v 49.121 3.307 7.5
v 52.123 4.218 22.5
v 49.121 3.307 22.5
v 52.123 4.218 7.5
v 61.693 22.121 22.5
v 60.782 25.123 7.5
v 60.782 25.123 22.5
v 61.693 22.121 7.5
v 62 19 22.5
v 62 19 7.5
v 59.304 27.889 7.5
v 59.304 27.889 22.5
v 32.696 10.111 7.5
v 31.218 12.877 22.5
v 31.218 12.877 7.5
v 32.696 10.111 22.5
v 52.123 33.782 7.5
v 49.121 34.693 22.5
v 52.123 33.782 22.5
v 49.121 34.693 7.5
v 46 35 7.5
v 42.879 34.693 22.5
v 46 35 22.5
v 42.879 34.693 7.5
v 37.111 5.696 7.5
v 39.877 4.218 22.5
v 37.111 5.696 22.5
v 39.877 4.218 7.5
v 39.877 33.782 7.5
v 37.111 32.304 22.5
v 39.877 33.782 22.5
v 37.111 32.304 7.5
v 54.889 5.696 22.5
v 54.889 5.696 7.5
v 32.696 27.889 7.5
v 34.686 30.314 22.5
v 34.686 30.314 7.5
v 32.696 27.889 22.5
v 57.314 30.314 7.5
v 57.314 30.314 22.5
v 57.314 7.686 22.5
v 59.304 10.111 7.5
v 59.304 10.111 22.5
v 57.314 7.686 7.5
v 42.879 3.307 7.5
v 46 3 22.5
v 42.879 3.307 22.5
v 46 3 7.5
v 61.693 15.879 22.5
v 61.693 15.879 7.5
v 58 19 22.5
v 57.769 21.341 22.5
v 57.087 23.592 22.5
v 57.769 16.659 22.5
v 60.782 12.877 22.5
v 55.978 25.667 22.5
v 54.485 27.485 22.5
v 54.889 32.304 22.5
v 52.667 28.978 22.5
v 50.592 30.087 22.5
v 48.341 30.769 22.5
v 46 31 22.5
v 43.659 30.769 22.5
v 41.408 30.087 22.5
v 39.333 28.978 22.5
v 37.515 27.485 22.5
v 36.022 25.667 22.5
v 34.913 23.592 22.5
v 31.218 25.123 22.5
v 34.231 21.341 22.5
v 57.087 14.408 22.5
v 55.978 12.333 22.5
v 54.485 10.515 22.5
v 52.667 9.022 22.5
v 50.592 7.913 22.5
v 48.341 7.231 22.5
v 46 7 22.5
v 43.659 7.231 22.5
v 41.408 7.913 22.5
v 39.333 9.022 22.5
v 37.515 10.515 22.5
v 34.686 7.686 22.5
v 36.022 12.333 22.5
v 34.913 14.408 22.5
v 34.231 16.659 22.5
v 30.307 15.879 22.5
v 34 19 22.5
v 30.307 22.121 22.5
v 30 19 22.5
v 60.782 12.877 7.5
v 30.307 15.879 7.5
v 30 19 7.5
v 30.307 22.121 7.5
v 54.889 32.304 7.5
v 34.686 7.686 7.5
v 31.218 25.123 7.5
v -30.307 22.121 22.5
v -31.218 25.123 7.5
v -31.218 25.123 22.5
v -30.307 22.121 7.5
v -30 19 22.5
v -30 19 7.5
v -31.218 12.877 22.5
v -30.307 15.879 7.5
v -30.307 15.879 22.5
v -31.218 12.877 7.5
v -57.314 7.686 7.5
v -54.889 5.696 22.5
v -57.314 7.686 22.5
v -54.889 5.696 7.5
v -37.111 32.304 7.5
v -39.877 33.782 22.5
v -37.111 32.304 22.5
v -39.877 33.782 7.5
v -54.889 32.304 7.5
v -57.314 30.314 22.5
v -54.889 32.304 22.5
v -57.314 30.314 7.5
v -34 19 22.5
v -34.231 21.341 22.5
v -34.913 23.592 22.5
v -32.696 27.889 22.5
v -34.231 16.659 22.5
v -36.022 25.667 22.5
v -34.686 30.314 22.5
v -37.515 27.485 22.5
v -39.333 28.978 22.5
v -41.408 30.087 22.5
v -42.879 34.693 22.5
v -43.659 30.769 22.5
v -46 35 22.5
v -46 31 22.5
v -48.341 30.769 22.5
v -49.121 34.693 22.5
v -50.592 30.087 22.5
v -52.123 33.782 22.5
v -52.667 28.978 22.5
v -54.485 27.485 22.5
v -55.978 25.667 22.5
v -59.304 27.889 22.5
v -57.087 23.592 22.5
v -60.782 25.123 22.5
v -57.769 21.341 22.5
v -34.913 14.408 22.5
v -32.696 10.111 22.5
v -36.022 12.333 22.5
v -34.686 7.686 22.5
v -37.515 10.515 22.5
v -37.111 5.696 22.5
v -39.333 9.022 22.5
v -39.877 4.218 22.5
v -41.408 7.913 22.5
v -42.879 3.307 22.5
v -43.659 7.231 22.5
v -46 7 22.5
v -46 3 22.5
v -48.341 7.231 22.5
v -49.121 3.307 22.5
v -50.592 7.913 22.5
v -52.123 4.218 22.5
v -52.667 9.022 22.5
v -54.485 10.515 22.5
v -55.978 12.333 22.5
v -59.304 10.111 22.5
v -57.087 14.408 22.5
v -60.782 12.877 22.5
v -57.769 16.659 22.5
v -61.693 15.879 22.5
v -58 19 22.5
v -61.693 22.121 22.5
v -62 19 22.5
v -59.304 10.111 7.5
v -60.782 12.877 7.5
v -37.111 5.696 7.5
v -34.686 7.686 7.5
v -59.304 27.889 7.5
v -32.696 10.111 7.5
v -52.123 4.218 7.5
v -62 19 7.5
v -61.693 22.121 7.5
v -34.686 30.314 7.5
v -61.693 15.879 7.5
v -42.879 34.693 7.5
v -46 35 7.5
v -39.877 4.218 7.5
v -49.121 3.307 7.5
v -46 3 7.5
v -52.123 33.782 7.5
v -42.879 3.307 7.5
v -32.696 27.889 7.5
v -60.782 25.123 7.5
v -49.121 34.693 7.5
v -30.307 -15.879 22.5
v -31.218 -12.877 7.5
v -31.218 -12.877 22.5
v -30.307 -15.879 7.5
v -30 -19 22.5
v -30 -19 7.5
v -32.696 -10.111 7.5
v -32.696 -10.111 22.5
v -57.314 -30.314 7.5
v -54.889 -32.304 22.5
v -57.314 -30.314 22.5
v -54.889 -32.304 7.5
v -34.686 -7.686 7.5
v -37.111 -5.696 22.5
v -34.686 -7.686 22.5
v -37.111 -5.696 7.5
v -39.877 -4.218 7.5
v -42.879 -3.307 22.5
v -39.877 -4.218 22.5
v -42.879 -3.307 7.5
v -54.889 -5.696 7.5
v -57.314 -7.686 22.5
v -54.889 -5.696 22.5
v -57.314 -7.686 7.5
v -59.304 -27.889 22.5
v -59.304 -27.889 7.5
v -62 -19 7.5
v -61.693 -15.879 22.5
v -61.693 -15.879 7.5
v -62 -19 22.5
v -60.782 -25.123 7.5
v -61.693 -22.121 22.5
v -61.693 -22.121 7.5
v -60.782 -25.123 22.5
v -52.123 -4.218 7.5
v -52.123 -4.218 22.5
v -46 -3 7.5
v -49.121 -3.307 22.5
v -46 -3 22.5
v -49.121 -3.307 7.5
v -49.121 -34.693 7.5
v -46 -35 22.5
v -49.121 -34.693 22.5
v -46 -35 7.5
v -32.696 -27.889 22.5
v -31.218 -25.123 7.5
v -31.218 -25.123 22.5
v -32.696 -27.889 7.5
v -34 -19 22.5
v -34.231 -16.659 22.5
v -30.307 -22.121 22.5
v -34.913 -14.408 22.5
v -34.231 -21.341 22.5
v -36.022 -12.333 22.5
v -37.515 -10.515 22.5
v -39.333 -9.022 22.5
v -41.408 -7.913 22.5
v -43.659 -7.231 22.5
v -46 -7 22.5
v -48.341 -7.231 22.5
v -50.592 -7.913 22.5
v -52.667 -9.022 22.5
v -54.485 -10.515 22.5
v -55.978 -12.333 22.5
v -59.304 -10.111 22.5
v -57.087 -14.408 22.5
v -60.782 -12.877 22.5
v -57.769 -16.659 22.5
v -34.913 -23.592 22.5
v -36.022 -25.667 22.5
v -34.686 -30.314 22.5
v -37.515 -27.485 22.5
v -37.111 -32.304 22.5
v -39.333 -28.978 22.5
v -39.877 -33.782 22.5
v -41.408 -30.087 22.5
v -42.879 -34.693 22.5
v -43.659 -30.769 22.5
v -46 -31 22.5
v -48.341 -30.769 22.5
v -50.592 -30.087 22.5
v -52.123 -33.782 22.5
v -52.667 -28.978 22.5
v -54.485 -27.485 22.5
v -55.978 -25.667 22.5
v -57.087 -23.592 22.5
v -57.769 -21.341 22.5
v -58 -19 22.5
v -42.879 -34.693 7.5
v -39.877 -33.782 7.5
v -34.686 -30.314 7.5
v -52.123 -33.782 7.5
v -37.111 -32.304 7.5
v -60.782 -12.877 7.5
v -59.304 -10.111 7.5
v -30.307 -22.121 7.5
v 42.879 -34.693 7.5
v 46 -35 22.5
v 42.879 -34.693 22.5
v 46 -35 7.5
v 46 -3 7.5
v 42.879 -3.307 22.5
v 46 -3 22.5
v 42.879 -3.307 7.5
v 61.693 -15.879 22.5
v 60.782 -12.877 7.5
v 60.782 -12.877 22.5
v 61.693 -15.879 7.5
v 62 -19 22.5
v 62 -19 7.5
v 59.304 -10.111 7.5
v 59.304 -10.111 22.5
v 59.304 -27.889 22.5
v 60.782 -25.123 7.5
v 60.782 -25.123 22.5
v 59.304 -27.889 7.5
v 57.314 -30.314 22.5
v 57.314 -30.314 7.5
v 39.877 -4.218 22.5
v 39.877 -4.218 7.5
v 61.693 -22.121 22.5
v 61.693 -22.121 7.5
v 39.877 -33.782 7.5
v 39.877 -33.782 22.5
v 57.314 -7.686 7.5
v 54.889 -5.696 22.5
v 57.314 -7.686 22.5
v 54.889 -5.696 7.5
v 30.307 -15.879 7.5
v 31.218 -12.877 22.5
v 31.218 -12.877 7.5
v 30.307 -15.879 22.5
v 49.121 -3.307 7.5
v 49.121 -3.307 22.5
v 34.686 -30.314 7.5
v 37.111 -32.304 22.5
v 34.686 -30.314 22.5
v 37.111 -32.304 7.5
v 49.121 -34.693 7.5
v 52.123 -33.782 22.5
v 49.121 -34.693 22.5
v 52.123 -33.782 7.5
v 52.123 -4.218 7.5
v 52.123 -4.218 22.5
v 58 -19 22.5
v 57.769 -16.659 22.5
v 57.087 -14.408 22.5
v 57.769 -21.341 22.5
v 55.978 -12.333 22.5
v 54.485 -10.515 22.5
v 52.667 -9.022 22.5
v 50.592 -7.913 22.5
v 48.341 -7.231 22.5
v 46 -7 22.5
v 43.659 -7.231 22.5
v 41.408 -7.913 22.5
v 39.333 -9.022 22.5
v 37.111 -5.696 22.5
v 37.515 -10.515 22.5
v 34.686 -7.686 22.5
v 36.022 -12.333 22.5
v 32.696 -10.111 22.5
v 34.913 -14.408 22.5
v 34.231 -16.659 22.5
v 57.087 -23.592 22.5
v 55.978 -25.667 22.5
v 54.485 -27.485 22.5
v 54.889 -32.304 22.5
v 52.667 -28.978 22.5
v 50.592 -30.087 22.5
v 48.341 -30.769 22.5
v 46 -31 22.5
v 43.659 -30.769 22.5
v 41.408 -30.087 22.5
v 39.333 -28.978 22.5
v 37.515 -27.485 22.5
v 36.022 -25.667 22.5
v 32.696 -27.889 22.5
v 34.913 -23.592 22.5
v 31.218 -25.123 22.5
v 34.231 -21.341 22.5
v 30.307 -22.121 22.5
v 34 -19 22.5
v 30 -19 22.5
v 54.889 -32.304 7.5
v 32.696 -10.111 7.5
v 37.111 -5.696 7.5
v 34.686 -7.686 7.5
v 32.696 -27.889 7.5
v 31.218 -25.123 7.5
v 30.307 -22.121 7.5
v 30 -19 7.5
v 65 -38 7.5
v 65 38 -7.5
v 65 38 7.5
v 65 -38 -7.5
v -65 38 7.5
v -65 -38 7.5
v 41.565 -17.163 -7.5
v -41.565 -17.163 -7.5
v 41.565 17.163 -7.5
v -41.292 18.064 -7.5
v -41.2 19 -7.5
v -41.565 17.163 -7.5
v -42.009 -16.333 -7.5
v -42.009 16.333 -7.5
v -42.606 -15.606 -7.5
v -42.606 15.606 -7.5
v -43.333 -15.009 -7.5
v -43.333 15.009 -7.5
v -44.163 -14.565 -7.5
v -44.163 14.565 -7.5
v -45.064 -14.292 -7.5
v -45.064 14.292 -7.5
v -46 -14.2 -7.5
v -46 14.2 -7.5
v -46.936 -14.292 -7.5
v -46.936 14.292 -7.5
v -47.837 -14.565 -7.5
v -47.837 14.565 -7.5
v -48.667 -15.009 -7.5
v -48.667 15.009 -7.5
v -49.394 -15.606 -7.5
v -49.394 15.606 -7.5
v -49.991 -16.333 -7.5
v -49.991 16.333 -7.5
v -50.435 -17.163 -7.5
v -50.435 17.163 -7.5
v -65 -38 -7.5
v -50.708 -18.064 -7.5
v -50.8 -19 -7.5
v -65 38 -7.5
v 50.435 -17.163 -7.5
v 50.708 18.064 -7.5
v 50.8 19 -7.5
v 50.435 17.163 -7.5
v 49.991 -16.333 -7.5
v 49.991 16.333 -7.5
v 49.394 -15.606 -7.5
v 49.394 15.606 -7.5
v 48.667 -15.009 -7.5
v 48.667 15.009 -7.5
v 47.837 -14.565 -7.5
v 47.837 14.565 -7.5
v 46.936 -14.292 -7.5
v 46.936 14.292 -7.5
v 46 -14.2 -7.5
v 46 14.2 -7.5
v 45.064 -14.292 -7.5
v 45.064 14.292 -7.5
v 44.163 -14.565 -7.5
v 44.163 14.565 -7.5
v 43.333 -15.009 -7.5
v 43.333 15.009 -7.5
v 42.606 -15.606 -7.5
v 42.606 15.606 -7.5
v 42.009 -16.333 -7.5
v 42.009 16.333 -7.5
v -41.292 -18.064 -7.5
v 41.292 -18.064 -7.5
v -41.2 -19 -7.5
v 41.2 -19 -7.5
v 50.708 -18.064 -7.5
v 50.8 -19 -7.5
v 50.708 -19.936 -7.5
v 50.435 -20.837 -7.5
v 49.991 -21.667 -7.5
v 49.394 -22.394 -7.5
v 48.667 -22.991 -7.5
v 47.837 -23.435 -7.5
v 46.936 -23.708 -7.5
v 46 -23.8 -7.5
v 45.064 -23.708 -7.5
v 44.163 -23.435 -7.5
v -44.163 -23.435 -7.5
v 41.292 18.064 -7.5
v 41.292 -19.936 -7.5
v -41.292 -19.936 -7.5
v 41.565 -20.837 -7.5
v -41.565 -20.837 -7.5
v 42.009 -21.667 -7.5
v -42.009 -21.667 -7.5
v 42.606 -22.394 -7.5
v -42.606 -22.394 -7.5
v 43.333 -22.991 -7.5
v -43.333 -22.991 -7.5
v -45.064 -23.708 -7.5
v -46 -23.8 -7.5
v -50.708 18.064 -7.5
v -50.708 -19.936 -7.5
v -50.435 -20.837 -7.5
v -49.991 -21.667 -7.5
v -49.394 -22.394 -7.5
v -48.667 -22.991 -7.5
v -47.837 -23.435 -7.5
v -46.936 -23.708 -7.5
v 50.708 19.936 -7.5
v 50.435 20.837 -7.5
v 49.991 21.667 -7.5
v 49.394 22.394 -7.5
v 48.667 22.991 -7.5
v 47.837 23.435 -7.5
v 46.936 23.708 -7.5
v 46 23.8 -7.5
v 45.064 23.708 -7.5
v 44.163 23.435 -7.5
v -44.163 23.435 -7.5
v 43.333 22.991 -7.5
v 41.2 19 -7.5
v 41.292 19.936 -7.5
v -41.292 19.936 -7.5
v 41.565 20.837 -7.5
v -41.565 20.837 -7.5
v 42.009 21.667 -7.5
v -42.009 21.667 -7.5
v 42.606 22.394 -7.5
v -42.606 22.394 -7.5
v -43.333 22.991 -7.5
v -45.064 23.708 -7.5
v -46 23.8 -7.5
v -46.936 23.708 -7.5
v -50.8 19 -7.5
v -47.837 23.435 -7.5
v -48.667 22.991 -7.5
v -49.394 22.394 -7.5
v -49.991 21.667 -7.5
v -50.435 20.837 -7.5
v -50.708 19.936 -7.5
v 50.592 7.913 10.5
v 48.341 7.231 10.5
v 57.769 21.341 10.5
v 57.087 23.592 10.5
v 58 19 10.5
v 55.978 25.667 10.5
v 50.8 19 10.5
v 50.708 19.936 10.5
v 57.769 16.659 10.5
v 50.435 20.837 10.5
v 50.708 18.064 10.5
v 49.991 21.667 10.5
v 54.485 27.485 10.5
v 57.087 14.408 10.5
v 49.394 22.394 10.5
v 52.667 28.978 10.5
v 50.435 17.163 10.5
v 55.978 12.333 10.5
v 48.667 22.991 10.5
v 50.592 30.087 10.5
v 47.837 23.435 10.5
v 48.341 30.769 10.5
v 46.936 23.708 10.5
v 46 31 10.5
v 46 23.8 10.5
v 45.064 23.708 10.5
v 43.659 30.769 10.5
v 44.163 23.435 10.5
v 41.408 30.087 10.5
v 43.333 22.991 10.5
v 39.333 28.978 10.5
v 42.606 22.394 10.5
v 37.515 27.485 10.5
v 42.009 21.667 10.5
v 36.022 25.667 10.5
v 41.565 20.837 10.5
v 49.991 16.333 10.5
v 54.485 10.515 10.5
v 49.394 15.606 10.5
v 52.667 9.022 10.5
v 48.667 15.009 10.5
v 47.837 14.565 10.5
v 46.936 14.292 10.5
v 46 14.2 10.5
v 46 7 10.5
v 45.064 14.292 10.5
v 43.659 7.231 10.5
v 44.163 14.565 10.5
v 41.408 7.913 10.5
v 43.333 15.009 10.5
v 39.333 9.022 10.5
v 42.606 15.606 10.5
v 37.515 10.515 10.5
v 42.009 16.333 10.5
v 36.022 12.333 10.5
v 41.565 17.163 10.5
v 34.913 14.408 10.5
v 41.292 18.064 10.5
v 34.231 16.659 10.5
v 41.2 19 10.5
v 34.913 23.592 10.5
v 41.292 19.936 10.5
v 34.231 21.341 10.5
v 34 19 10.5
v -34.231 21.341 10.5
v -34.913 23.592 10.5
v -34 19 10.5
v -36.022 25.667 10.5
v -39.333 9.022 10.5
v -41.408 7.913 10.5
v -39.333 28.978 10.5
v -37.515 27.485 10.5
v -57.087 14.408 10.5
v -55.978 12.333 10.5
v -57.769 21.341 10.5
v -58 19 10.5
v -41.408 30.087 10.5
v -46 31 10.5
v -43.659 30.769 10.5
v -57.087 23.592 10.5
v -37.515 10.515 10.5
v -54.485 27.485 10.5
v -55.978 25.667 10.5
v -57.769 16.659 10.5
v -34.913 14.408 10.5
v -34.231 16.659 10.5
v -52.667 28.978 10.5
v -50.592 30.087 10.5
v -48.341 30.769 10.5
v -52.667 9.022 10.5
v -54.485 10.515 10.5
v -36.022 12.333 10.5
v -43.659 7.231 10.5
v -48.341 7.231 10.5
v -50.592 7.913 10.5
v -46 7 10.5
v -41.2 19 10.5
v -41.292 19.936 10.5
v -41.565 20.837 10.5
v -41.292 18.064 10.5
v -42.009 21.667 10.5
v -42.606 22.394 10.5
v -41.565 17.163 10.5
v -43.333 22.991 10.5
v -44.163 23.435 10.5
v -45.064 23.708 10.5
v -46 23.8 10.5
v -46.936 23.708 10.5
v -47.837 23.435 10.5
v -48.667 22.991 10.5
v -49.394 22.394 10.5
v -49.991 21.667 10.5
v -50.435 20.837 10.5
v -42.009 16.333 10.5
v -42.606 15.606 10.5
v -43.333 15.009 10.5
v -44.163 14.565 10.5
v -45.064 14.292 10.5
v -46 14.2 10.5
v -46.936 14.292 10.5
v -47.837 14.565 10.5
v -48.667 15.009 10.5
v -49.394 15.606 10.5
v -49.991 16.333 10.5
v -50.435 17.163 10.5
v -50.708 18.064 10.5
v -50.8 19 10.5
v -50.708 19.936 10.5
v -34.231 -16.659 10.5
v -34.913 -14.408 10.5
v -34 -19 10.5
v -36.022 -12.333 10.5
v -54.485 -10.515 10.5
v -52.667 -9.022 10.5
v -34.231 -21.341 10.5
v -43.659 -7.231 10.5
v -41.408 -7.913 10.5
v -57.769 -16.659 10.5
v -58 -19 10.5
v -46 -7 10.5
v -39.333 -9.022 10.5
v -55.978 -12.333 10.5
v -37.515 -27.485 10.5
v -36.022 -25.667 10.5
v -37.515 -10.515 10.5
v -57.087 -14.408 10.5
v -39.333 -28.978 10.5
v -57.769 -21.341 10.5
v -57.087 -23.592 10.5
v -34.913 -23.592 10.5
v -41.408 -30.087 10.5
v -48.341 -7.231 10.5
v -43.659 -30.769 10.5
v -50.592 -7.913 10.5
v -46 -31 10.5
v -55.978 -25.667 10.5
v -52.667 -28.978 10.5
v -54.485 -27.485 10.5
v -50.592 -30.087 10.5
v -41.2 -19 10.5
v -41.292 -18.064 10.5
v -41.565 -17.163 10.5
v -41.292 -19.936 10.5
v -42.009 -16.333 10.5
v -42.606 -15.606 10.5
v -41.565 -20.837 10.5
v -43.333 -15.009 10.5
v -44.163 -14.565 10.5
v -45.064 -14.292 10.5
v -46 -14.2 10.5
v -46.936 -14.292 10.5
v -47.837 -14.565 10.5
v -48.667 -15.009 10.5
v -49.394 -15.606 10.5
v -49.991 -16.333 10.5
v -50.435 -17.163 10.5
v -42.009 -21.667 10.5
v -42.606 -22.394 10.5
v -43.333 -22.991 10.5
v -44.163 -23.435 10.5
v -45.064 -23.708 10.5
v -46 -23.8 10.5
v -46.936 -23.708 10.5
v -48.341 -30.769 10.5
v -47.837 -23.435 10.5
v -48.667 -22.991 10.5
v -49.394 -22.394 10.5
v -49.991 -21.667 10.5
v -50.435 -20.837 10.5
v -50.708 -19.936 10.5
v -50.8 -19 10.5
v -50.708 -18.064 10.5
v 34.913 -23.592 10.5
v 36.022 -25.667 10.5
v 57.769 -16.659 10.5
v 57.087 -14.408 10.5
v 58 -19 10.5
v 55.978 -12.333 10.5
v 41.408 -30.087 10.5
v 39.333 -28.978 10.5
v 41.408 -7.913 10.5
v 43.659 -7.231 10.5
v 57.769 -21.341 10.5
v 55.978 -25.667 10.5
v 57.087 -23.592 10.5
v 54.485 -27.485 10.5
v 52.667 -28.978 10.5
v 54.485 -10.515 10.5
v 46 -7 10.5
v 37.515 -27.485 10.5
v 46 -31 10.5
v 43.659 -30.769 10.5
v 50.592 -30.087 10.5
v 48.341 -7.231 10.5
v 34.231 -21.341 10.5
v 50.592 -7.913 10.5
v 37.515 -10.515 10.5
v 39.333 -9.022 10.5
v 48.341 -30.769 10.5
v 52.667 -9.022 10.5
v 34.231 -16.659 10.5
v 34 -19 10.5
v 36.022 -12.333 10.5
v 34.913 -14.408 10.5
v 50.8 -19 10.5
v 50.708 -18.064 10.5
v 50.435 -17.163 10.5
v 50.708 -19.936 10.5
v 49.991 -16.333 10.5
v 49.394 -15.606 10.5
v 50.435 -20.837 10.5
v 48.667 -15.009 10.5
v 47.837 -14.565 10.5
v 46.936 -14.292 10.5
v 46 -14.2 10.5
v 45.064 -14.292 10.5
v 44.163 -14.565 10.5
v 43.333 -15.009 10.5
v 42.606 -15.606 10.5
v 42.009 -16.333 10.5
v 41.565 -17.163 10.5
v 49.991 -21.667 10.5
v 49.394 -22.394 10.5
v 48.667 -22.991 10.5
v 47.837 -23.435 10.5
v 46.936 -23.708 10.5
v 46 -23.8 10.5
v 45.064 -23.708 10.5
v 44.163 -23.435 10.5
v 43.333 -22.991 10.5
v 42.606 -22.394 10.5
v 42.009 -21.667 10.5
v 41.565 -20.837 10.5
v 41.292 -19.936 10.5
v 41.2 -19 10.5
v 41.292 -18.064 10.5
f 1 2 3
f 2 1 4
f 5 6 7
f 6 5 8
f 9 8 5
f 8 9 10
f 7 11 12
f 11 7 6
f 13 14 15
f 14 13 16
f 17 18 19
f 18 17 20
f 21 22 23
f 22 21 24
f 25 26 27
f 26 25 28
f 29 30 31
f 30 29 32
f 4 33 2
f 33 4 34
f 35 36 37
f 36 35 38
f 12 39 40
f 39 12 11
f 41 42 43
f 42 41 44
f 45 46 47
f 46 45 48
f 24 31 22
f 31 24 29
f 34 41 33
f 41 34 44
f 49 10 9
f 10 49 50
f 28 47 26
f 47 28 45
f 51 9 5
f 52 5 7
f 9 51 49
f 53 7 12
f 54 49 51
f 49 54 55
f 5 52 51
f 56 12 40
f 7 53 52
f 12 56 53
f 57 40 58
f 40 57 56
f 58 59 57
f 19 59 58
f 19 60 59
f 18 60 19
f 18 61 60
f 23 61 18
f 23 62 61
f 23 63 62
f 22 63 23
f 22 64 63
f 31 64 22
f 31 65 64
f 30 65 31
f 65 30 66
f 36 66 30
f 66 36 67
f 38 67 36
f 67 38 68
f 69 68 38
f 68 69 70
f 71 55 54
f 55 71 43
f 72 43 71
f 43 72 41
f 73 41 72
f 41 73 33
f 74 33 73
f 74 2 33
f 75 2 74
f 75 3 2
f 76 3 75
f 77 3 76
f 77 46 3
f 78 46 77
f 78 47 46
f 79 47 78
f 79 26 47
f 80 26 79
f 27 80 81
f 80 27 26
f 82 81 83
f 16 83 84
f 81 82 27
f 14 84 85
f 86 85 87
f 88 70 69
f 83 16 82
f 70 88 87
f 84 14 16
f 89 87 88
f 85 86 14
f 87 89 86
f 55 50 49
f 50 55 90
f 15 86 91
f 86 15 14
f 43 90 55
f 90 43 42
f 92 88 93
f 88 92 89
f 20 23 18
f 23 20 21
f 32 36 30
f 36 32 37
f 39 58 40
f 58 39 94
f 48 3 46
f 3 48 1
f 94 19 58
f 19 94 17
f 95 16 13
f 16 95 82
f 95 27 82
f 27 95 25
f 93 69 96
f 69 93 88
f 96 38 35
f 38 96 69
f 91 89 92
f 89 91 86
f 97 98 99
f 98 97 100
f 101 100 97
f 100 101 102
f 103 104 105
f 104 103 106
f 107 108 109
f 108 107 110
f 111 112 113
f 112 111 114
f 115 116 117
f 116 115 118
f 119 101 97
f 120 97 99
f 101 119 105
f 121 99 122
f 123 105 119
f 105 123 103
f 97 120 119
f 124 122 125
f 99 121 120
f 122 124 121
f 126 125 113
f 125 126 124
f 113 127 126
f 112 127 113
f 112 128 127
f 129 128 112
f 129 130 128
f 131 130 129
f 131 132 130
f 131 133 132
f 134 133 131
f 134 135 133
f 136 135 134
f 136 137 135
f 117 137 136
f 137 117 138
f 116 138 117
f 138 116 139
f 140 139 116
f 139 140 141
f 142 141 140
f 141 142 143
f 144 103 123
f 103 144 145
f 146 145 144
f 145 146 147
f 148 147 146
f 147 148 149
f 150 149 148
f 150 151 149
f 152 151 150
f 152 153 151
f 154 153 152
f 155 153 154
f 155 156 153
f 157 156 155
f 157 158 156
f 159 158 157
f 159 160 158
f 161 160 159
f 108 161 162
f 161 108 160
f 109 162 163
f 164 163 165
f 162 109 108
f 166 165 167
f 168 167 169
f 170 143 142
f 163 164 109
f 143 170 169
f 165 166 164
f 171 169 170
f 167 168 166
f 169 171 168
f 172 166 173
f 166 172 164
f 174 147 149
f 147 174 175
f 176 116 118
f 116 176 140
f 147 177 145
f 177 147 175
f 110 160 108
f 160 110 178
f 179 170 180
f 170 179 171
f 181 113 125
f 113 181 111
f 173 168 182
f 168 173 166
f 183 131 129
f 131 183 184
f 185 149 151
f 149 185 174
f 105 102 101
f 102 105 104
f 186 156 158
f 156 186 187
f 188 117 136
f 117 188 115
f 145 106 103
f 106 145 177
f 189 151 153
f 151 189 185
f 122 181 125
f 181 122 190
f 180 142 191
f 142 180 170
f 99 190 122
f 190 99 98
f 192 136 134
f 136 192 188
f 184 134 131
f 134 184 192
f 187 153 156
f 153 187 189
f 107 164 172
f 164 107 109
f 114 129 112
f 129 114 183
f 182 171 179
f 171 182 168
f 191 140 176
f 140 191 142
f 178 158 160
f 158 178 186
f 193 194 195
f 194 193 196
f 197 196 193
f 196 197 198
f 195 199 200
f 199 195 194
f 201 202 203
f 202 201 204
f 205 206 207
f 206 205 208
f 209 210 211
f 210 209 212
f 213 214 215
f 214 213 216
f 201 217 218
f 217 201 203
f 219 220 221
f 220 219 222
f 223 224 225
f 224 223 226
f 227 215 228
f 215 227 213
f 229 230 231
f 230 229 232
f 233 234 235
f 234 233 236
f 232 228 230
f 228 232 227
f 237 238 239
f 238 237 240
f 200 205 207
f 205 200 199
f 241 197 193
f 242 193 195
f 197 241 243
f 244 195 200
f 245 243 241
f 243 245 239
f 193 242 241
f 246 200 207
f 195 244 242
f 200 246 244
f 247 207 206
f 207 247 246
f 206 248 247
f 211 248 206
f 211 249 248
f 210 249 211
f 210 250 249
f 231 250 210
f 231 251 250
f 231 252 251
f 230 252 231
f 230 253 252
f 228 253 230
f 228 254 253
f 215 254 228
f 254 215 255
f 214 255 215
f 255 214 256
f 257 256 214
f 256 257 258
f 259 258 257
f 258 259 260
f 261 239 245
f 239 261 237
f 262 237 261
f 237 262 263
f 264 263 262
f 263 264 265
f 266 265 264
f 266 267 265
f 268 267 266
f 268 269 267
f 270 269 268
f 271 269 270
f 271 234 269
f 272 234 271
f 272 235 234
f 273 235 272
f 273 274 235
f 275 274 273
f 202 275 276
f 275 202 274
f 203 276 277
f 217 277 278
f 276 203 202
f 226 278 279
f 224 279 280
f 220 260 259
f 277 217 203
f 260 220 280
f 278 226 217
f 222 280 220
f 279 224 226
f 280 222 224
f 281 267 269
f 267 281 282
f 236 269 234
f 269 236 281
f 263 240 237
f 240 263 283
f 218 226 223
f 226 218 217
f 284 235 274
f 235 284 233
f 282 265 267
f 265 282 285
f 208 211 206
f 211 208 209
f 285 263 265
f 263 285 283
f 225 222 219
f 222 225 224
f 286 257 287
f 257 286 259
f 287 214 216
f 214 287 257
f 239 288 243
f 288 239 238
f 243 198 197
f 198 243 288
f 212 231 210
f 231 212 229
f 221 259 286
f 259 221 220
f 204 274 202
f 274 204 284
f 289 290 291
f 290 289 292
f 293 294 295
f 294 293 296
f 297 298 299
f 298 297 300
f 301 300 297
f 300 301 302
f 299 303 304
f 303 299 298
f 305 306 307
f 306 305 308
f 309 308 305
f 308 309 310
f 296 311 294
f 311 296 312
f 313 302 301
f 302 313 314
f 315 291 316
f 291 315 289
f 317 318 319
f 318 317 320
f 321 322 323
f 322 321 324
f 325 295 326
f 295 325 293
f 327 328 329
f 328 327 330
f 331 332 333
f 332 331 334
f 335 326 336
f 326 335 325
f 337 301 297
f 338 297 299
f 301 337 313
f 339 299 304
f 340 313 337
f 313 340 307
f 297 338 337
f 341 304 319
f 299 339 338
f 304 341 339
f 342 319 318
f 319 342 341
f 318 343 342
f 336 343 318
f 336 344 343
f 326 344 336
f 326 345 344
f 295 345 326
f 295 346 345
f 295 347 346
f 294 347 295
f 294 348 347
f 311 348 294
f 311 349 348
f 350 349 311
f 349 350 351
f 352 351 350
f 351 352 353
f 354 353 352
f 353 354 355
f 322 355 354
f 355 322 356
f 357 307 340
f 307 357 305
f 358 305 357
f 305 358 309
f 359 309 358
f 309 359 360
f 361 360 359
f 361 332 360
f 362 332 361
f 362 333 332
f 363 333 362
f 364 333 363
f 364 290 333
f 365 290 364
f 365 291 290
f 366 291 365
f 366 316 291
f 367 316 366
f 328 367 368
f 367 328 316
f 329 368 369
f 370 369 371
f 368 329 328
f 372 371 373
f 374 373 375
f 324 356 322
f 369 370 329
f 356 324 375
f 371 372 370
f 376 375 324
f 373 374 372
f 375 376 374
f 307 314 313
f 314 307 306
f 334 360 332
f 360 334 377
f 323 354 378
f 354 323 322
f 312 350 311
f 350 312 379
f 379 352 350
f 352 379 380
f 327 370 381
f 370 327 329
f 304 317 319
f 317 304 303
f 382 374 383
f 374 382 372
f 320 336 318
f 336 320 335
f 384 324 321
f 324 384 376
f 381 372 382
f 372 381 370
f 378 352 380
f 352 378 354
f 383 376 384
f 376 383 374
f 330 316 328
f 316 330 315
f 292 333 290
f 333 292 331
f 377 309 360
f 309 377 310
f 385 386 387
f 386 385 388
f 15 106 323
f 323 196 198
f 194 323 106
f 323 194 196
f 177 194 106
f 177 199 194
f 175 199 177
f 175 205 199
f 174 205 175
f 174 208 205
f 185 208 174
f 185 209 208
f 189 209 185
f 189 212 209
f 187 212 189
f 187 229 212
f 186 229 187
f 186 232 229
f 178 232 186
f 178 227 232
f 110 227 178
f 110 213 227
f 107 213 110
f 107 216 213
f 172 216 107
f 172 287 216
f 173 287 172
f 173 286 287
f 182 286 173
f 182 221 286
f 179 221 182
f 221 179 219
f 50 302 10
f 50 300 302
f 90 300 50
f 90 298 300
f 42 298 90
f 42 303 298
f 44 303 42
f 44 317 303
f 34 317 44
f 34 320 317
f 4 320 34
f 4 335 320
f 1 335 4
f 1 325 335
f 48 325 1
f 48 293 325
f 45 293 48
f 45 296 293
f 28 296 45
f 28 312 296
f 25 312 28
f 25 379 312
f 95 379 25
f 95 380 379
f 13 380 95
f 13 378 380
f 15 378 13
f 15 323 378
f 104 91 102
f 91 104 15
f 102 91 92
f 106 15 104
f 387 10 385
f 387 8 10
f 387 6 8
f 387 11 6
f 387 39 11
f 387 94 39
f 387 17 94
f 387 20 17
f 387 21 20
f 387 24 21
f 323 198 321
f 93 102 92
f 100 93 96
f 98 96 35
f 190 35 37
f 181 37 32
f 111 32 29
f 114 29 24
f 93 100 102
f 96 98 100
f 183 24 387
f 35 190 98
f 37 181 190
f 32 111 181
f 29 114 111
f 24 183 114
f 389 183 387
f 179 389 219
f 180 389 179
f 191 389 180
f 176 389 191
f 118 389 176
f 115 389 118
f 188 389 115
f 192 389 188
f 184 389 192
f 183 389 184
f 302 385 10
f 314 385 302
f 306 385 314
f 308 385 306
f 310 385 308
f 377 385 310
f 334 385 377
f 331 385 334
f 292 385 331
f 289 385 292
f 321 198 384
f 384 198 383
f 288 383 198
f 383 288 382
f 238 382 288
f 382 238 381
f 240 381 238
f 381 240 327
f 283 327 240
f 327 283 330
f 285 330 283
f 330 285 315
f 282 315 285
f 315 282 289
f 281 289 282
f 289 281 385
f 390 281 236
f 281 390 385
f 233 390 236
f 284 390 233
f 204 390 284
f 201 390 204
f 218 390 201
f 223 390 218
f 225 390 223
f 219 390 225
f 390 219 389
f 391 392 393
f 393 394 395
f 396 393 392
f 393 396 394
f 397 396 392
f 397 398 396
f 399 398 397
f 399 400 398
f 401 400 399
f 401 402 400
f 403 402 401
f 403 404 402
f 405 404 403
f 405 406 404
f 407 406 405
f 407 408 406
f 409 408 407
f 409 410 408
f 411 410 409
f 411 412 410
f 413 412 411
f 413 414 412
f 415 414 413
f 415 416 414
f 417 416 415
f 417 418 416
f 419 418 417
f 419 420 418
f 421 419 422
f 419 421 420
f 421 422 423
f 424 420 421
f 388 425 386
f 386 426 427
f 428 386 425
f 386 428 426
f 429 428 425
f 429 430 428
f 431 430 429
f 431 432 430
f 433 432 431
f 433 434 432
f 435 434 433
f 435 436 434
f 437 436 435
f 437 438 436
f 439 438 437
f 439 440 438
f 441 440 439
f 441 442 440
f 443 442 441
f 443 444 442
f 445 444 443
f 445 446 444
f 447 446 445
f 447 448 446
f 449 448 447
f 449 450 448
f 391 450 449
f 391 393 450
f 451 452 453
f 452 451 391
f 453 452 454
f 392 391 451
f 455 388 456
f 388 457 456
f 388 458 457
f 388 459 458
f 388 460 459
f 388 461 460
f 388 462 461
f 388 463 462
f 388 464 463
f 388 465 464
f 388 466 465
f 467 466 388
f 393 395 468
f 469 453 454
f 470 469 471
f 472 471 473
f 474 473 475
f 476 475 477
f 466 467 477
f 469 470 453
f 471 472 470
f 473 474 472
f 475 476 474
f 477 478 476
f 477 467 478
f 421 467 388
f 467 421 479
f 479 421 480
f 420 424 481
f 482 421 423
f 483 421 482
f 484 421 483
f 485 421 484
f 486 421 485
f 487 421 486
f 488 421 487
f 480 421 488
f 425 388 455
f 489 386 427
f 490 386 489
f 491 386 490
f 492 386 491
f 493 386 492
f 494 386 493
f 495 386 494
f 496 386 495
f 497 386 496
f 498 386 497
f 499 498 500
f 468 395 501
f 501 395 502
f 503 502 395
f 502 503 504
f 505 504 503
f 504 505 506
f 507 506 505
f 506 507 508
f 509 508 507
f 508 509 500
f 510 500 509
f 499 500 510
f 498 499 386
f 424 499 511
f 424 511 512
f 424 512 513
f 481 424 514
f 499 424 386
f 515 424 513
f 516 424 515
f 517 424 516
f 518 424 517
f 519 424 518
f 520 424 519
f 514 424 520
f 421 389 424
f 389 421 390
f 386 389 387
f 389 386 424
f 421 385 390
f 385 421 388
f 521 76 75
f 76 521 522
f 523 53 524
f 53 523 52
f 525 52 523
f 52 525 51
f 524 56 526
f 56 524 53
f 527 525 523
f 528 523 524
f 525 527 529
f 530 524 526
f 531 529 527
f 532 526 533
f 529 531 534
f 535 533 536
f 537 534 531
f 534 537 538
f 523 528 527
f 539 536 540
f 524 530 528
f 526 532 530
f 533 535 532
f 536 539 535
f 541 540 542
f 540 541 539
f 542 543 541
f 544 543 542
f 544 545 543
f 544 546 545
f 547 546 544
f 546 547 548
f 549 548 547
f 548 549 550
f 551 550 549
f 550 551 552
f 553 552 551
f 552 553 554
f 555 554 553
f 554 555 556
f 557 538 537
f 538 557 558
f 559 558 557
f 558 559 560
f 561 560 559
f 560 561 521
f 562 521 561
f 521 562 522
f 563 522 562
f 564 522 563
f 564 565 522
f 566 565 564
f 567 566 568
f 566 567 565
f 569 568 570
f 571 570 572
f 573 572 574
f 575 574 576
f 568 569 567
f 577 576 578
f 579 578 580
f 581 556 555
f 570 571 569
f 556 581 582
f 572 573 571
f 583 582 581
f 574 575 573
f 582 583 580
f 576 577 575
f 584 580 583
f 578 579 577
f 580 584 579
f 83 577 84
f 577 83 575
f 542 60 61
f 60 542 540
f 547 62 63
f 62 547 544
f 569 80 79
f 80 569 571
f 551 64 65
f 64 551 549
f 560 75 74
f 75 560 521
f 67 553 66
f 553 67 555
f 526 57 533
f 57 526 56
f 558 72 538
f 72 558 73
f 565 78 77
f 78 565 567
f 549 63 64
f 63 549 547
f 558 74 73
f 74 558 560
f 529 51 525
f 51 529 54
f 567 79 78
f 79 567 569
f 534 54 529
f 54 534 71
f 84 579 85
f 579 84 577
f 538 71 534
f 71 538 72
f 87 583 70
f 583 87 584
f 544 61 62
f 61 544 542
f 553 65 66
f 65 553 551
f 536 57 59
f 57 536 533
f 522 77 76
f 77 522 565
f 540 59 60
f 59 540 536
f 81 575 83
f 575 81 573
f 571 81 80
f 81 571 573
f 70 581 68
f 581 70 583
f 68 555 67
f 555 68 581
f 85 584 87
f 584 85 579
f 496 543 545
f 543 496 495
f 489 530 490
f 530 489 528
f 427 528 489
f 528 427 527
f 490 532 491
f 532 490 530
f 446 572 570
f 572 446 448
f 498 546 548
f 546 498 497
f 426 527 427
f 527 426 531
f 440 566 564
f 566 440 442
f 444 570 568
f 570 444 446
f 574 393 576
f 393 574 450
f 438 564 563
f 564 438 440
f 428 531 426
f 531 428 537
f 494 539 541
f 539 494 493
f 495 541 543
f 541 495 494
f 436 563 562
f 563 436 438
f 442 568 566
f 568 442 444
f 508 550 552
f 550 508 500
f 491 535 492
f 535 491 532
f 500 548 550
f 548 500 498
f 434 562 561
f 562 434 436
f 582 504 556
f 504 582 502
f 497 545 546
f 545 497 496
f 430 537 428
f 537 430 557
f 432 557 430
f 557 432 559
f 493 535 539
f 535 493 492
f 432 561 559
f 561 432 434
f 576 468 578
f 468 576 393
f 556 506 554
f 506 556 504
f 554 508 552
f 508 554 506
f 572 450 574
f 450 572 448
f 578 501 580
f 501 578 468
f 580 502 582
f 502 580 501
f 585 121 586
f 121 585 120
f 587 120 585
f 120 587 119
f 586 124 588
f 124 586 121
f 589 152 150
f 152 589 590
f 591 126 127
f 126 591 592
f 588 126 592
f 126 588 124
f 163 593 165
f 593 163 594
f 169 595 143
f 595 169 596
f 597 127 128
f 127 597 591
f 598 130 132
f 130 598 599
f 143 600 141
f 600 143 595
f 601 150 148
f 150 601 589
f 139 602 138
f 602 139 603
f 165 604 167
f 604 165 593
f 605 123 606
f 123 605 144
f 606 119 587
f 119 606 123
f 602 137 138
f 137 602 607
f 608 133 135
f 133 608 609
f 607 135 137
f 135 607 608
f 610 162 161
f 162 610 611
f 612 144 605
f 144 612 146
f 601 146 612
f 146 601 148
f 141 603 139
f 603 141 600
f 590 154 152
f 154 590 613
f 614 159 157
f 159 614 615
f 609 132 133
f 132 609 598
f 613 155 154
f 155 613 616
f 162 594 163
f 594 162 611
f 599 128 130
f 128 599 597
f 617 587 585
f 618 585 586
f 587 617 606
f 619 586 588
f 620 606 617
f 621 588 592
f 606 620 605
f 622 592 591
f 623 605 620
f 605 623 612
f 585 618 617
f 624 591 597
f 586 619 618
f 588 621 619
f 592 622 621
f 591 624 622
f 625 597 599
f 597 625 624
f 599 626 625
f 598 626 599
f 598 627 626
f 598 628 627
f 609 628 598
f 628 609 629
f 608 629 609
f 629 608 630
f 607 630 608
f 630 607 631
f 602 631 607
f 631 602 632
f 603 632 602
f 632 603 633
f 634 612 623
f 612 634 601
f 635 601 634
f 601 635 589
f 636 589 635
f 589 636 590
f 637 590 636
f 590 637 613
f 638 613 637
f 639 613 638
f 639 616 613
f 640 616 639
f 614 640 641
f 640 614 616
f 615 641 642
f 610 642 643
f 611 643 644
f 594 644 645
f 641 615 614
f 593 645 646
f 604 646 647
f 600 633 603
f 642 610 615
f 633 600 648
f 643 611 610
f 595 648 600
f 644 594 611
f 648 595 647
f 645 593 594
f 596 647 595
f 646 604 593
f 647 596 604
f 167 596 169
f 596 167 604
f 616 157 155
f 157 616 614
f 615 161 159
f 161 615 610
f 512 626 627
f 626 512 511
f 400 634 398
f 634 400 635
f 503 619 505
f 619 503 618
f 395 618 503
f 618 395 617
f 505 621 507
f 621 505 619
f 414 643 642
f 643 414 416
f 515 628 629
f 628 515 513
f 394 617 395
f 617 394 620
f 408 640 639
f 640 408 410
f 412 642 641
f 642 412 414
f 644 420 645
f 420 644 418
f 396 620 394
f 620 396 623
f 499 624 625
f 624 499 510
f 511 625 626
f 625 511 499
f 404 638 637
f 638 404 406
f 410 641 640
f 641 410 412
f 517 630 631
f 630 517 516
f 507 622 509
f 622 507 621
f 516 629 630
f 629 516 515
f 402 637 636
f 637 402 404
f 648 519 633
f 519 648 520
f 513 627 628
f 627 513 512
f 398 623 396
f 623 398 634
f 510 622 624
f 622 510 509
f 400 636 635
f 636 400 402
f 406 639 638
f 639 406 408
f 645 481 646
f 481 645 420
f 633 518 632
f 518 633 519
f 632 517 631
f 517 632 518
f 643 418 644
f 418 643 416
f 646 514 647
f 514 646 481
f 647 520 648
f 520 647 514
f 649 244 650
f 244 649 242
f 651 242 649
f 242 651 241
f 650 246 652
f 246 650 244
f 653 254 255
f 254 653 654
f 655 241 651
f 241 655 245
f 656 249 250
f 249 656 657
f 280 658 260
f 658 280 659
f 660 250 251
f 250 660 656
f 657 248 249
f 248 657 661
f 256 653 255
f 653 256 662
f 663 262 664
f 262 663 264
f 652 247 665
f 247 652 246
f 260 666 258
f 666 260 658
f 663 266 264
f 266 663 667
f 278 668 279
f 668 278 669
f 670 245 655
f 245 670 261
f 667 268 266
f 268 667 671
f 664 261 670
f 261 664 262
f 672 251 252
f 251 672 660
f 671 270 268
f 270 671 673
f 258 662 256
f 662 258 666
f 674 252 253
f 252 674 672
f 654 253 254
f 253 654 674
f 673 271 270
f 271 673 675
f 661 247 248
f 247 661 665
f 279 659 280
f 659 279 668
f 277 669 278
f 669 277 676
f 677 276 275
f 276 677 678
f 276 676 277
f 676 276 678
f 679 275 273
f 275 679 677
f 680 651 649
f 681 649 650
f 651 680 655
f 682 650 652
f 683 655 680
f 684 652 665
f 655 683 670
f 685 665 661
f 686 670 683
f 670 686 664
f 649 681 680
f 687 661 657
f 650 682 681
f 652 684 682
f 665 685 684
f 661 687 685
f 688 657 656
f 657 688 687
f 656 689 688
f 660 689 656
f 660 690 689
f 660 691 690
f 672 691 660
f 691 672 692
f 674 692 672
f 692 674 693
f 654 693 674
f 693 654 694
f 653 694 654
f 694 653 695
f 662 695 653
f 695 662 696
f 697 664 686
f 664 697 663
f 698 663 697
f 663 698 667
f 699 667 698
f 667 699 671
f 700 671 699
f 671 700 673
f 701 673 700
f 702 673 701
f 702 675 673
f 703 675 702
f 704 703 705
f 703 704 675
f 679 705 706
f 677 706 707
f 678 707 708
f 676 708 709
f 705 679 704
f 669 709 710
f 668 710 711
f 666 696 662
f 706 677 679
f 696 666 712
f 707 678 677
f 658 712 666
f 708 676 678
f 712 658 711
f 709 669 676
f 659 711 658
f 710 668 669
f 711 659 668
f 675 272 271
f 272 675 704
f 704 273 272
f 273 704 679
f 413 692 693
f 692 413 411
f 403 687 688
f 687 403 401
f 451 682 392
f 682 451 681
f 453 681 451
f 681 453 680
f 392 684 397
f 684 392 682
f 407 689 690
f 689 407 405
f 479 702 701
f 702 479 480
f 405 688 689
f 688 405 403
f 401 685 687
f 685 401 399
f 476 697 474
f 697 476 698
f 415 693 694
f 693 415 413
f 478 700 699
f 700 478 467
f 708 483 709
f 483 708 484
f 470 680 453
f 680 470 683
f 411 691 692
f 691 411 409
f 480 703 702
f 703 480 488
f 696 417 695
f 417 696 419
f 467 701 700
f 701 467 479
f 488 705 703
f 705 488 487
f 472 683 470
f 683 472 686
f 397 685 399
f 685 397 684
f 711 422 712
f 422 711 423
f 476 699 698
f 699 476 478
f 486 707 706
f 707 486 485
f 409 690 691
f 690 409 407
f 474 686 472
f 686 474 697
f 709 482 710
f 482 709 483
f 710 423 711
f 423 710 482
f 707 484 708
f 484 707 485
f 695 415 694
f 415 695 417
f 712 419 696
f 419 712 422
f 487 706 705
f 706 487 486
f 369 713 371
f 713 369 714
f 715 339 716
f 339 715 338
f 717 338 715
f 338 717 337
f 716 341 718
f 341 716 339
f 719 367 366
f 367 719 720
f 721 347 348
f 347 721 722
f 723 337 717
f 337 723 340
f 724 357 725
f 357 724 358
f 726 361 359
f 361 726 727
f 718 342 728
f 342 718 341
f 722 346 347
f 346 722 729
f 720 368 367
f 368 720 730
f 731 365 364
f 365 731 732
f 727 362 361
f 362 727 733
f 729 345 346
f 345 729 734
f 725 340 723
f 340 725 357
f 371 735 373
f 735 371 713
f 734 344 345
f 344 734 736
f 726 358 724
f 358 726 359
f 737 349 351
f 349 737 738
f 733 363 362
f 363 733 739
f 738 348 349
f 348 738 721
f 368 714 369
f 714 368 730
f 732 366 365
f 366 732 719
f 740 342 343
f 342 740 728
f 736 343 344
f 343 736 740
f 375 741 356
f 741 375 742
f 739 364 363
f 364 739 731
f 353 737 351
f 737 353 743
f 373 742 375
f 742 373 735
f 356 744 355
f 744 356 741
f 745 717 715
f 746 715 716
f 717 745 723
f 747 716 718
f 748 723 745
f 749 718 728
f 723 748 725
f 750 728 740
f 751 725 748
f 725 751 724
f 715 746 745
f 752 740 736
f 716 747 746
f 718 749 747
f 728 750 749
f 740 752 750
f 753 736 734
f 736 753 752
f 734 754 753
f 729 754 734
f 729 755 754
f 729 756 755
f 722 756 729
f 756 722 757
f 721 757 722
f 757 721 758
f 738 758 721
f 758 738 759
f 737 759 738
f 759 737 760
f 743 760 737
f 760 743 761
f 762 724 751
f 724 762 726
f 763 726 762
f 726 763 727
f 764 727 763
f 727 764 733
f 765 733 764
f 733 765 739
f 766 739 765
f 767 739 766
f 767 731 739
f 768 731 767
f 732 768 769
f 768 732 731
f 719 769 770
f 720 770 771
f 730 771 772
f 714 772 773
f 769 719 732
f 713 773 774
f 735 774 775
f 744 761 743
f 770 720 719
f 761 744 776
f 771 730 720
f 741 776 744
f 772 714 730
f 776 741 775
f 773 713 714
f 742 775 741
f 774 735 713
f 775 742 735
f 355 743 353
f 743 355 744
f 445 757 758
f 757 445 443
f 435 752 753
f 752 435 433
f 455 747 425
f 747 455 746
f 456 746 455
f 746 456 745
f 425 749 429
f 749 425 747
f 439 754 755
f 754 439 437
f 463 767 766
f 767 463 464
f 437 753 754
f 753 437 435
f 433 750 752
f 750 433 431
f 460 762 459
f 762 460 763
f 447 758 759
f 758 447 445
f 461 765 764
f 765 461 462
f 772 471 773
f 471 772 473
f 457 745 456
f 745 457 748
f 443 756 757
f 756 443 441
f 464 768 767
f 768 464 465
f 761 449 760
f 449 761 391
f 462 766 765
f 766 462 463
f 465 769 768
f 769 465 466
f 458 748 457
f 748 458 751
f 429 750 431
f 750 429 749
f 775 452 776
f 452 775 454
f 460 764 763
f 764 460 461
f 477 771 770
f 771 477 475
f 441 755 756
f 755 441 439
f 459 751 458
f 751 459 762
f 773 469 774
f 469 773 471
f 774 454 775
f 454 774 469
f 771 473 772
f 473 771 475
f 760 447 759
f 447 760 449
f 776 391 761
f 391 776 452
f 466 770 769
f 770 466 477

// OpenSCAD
$fn = 32;

// ----------------------------------------------------------------------
// Socket pad plate
// bosses with counterbored sockets for the screws
// ----------------------------------------------------------------------

// --- parameters (mm) ---
base_t = 15;            // base plate thickness
boss_h = 15;            // boss height above the base plate
boss_d = 32;            // boss diameter
socket_d = 24;          // socket diameter
socket_depth = 12;      // socket depth from the boss face
bolt_d = 9.6;           // screw clearance hole through the socket floor
plate = [130, 76, 15];  // overall size (x, y, z)
edge = 19;              // boss centre offset from the plate edge
pads = 4;               // boss count, one per corner

// --- derived feature positions (mm) ---
height = base_t + boss_h;        // = 30   overall height of the part
corner_x = plate[0] / 2 - edge;  // = 46   boss centre X
corner_y = plate[1] / 2 - edge;  // = 19   boss centre Y
feature_centers = [
  [corner_x, corner_y],
  [-corner_x, corner_y],
  [-corner_x, -corner_y],
  [corner_x, -corner_y]
];   // boss centres: sockets, holes and the pads themselves are placed from here

// base plate, bosses on feature_centers, socket + through hole in each
difference() {
  union() {
    cube(plate, center = true);
    for (centre = feature_centers)
      translate([centre[0], centre[1], plate[2] / 2 - 1])
        cylinder(d = boss_d, h = boss_h + 1);
  }
  for (centre = feature_centers) {
    translate([centre[0], centre[1], plate[2] / 2 + boss_h - socket_depth])
      cylinder(d = socket_d, h = socket_depth + 1);
    translate([centre[0], centre[1], -height])
      cylinder(d = bolt_d, h = 2 * height + 2);  // through the socket floor
  }
}
